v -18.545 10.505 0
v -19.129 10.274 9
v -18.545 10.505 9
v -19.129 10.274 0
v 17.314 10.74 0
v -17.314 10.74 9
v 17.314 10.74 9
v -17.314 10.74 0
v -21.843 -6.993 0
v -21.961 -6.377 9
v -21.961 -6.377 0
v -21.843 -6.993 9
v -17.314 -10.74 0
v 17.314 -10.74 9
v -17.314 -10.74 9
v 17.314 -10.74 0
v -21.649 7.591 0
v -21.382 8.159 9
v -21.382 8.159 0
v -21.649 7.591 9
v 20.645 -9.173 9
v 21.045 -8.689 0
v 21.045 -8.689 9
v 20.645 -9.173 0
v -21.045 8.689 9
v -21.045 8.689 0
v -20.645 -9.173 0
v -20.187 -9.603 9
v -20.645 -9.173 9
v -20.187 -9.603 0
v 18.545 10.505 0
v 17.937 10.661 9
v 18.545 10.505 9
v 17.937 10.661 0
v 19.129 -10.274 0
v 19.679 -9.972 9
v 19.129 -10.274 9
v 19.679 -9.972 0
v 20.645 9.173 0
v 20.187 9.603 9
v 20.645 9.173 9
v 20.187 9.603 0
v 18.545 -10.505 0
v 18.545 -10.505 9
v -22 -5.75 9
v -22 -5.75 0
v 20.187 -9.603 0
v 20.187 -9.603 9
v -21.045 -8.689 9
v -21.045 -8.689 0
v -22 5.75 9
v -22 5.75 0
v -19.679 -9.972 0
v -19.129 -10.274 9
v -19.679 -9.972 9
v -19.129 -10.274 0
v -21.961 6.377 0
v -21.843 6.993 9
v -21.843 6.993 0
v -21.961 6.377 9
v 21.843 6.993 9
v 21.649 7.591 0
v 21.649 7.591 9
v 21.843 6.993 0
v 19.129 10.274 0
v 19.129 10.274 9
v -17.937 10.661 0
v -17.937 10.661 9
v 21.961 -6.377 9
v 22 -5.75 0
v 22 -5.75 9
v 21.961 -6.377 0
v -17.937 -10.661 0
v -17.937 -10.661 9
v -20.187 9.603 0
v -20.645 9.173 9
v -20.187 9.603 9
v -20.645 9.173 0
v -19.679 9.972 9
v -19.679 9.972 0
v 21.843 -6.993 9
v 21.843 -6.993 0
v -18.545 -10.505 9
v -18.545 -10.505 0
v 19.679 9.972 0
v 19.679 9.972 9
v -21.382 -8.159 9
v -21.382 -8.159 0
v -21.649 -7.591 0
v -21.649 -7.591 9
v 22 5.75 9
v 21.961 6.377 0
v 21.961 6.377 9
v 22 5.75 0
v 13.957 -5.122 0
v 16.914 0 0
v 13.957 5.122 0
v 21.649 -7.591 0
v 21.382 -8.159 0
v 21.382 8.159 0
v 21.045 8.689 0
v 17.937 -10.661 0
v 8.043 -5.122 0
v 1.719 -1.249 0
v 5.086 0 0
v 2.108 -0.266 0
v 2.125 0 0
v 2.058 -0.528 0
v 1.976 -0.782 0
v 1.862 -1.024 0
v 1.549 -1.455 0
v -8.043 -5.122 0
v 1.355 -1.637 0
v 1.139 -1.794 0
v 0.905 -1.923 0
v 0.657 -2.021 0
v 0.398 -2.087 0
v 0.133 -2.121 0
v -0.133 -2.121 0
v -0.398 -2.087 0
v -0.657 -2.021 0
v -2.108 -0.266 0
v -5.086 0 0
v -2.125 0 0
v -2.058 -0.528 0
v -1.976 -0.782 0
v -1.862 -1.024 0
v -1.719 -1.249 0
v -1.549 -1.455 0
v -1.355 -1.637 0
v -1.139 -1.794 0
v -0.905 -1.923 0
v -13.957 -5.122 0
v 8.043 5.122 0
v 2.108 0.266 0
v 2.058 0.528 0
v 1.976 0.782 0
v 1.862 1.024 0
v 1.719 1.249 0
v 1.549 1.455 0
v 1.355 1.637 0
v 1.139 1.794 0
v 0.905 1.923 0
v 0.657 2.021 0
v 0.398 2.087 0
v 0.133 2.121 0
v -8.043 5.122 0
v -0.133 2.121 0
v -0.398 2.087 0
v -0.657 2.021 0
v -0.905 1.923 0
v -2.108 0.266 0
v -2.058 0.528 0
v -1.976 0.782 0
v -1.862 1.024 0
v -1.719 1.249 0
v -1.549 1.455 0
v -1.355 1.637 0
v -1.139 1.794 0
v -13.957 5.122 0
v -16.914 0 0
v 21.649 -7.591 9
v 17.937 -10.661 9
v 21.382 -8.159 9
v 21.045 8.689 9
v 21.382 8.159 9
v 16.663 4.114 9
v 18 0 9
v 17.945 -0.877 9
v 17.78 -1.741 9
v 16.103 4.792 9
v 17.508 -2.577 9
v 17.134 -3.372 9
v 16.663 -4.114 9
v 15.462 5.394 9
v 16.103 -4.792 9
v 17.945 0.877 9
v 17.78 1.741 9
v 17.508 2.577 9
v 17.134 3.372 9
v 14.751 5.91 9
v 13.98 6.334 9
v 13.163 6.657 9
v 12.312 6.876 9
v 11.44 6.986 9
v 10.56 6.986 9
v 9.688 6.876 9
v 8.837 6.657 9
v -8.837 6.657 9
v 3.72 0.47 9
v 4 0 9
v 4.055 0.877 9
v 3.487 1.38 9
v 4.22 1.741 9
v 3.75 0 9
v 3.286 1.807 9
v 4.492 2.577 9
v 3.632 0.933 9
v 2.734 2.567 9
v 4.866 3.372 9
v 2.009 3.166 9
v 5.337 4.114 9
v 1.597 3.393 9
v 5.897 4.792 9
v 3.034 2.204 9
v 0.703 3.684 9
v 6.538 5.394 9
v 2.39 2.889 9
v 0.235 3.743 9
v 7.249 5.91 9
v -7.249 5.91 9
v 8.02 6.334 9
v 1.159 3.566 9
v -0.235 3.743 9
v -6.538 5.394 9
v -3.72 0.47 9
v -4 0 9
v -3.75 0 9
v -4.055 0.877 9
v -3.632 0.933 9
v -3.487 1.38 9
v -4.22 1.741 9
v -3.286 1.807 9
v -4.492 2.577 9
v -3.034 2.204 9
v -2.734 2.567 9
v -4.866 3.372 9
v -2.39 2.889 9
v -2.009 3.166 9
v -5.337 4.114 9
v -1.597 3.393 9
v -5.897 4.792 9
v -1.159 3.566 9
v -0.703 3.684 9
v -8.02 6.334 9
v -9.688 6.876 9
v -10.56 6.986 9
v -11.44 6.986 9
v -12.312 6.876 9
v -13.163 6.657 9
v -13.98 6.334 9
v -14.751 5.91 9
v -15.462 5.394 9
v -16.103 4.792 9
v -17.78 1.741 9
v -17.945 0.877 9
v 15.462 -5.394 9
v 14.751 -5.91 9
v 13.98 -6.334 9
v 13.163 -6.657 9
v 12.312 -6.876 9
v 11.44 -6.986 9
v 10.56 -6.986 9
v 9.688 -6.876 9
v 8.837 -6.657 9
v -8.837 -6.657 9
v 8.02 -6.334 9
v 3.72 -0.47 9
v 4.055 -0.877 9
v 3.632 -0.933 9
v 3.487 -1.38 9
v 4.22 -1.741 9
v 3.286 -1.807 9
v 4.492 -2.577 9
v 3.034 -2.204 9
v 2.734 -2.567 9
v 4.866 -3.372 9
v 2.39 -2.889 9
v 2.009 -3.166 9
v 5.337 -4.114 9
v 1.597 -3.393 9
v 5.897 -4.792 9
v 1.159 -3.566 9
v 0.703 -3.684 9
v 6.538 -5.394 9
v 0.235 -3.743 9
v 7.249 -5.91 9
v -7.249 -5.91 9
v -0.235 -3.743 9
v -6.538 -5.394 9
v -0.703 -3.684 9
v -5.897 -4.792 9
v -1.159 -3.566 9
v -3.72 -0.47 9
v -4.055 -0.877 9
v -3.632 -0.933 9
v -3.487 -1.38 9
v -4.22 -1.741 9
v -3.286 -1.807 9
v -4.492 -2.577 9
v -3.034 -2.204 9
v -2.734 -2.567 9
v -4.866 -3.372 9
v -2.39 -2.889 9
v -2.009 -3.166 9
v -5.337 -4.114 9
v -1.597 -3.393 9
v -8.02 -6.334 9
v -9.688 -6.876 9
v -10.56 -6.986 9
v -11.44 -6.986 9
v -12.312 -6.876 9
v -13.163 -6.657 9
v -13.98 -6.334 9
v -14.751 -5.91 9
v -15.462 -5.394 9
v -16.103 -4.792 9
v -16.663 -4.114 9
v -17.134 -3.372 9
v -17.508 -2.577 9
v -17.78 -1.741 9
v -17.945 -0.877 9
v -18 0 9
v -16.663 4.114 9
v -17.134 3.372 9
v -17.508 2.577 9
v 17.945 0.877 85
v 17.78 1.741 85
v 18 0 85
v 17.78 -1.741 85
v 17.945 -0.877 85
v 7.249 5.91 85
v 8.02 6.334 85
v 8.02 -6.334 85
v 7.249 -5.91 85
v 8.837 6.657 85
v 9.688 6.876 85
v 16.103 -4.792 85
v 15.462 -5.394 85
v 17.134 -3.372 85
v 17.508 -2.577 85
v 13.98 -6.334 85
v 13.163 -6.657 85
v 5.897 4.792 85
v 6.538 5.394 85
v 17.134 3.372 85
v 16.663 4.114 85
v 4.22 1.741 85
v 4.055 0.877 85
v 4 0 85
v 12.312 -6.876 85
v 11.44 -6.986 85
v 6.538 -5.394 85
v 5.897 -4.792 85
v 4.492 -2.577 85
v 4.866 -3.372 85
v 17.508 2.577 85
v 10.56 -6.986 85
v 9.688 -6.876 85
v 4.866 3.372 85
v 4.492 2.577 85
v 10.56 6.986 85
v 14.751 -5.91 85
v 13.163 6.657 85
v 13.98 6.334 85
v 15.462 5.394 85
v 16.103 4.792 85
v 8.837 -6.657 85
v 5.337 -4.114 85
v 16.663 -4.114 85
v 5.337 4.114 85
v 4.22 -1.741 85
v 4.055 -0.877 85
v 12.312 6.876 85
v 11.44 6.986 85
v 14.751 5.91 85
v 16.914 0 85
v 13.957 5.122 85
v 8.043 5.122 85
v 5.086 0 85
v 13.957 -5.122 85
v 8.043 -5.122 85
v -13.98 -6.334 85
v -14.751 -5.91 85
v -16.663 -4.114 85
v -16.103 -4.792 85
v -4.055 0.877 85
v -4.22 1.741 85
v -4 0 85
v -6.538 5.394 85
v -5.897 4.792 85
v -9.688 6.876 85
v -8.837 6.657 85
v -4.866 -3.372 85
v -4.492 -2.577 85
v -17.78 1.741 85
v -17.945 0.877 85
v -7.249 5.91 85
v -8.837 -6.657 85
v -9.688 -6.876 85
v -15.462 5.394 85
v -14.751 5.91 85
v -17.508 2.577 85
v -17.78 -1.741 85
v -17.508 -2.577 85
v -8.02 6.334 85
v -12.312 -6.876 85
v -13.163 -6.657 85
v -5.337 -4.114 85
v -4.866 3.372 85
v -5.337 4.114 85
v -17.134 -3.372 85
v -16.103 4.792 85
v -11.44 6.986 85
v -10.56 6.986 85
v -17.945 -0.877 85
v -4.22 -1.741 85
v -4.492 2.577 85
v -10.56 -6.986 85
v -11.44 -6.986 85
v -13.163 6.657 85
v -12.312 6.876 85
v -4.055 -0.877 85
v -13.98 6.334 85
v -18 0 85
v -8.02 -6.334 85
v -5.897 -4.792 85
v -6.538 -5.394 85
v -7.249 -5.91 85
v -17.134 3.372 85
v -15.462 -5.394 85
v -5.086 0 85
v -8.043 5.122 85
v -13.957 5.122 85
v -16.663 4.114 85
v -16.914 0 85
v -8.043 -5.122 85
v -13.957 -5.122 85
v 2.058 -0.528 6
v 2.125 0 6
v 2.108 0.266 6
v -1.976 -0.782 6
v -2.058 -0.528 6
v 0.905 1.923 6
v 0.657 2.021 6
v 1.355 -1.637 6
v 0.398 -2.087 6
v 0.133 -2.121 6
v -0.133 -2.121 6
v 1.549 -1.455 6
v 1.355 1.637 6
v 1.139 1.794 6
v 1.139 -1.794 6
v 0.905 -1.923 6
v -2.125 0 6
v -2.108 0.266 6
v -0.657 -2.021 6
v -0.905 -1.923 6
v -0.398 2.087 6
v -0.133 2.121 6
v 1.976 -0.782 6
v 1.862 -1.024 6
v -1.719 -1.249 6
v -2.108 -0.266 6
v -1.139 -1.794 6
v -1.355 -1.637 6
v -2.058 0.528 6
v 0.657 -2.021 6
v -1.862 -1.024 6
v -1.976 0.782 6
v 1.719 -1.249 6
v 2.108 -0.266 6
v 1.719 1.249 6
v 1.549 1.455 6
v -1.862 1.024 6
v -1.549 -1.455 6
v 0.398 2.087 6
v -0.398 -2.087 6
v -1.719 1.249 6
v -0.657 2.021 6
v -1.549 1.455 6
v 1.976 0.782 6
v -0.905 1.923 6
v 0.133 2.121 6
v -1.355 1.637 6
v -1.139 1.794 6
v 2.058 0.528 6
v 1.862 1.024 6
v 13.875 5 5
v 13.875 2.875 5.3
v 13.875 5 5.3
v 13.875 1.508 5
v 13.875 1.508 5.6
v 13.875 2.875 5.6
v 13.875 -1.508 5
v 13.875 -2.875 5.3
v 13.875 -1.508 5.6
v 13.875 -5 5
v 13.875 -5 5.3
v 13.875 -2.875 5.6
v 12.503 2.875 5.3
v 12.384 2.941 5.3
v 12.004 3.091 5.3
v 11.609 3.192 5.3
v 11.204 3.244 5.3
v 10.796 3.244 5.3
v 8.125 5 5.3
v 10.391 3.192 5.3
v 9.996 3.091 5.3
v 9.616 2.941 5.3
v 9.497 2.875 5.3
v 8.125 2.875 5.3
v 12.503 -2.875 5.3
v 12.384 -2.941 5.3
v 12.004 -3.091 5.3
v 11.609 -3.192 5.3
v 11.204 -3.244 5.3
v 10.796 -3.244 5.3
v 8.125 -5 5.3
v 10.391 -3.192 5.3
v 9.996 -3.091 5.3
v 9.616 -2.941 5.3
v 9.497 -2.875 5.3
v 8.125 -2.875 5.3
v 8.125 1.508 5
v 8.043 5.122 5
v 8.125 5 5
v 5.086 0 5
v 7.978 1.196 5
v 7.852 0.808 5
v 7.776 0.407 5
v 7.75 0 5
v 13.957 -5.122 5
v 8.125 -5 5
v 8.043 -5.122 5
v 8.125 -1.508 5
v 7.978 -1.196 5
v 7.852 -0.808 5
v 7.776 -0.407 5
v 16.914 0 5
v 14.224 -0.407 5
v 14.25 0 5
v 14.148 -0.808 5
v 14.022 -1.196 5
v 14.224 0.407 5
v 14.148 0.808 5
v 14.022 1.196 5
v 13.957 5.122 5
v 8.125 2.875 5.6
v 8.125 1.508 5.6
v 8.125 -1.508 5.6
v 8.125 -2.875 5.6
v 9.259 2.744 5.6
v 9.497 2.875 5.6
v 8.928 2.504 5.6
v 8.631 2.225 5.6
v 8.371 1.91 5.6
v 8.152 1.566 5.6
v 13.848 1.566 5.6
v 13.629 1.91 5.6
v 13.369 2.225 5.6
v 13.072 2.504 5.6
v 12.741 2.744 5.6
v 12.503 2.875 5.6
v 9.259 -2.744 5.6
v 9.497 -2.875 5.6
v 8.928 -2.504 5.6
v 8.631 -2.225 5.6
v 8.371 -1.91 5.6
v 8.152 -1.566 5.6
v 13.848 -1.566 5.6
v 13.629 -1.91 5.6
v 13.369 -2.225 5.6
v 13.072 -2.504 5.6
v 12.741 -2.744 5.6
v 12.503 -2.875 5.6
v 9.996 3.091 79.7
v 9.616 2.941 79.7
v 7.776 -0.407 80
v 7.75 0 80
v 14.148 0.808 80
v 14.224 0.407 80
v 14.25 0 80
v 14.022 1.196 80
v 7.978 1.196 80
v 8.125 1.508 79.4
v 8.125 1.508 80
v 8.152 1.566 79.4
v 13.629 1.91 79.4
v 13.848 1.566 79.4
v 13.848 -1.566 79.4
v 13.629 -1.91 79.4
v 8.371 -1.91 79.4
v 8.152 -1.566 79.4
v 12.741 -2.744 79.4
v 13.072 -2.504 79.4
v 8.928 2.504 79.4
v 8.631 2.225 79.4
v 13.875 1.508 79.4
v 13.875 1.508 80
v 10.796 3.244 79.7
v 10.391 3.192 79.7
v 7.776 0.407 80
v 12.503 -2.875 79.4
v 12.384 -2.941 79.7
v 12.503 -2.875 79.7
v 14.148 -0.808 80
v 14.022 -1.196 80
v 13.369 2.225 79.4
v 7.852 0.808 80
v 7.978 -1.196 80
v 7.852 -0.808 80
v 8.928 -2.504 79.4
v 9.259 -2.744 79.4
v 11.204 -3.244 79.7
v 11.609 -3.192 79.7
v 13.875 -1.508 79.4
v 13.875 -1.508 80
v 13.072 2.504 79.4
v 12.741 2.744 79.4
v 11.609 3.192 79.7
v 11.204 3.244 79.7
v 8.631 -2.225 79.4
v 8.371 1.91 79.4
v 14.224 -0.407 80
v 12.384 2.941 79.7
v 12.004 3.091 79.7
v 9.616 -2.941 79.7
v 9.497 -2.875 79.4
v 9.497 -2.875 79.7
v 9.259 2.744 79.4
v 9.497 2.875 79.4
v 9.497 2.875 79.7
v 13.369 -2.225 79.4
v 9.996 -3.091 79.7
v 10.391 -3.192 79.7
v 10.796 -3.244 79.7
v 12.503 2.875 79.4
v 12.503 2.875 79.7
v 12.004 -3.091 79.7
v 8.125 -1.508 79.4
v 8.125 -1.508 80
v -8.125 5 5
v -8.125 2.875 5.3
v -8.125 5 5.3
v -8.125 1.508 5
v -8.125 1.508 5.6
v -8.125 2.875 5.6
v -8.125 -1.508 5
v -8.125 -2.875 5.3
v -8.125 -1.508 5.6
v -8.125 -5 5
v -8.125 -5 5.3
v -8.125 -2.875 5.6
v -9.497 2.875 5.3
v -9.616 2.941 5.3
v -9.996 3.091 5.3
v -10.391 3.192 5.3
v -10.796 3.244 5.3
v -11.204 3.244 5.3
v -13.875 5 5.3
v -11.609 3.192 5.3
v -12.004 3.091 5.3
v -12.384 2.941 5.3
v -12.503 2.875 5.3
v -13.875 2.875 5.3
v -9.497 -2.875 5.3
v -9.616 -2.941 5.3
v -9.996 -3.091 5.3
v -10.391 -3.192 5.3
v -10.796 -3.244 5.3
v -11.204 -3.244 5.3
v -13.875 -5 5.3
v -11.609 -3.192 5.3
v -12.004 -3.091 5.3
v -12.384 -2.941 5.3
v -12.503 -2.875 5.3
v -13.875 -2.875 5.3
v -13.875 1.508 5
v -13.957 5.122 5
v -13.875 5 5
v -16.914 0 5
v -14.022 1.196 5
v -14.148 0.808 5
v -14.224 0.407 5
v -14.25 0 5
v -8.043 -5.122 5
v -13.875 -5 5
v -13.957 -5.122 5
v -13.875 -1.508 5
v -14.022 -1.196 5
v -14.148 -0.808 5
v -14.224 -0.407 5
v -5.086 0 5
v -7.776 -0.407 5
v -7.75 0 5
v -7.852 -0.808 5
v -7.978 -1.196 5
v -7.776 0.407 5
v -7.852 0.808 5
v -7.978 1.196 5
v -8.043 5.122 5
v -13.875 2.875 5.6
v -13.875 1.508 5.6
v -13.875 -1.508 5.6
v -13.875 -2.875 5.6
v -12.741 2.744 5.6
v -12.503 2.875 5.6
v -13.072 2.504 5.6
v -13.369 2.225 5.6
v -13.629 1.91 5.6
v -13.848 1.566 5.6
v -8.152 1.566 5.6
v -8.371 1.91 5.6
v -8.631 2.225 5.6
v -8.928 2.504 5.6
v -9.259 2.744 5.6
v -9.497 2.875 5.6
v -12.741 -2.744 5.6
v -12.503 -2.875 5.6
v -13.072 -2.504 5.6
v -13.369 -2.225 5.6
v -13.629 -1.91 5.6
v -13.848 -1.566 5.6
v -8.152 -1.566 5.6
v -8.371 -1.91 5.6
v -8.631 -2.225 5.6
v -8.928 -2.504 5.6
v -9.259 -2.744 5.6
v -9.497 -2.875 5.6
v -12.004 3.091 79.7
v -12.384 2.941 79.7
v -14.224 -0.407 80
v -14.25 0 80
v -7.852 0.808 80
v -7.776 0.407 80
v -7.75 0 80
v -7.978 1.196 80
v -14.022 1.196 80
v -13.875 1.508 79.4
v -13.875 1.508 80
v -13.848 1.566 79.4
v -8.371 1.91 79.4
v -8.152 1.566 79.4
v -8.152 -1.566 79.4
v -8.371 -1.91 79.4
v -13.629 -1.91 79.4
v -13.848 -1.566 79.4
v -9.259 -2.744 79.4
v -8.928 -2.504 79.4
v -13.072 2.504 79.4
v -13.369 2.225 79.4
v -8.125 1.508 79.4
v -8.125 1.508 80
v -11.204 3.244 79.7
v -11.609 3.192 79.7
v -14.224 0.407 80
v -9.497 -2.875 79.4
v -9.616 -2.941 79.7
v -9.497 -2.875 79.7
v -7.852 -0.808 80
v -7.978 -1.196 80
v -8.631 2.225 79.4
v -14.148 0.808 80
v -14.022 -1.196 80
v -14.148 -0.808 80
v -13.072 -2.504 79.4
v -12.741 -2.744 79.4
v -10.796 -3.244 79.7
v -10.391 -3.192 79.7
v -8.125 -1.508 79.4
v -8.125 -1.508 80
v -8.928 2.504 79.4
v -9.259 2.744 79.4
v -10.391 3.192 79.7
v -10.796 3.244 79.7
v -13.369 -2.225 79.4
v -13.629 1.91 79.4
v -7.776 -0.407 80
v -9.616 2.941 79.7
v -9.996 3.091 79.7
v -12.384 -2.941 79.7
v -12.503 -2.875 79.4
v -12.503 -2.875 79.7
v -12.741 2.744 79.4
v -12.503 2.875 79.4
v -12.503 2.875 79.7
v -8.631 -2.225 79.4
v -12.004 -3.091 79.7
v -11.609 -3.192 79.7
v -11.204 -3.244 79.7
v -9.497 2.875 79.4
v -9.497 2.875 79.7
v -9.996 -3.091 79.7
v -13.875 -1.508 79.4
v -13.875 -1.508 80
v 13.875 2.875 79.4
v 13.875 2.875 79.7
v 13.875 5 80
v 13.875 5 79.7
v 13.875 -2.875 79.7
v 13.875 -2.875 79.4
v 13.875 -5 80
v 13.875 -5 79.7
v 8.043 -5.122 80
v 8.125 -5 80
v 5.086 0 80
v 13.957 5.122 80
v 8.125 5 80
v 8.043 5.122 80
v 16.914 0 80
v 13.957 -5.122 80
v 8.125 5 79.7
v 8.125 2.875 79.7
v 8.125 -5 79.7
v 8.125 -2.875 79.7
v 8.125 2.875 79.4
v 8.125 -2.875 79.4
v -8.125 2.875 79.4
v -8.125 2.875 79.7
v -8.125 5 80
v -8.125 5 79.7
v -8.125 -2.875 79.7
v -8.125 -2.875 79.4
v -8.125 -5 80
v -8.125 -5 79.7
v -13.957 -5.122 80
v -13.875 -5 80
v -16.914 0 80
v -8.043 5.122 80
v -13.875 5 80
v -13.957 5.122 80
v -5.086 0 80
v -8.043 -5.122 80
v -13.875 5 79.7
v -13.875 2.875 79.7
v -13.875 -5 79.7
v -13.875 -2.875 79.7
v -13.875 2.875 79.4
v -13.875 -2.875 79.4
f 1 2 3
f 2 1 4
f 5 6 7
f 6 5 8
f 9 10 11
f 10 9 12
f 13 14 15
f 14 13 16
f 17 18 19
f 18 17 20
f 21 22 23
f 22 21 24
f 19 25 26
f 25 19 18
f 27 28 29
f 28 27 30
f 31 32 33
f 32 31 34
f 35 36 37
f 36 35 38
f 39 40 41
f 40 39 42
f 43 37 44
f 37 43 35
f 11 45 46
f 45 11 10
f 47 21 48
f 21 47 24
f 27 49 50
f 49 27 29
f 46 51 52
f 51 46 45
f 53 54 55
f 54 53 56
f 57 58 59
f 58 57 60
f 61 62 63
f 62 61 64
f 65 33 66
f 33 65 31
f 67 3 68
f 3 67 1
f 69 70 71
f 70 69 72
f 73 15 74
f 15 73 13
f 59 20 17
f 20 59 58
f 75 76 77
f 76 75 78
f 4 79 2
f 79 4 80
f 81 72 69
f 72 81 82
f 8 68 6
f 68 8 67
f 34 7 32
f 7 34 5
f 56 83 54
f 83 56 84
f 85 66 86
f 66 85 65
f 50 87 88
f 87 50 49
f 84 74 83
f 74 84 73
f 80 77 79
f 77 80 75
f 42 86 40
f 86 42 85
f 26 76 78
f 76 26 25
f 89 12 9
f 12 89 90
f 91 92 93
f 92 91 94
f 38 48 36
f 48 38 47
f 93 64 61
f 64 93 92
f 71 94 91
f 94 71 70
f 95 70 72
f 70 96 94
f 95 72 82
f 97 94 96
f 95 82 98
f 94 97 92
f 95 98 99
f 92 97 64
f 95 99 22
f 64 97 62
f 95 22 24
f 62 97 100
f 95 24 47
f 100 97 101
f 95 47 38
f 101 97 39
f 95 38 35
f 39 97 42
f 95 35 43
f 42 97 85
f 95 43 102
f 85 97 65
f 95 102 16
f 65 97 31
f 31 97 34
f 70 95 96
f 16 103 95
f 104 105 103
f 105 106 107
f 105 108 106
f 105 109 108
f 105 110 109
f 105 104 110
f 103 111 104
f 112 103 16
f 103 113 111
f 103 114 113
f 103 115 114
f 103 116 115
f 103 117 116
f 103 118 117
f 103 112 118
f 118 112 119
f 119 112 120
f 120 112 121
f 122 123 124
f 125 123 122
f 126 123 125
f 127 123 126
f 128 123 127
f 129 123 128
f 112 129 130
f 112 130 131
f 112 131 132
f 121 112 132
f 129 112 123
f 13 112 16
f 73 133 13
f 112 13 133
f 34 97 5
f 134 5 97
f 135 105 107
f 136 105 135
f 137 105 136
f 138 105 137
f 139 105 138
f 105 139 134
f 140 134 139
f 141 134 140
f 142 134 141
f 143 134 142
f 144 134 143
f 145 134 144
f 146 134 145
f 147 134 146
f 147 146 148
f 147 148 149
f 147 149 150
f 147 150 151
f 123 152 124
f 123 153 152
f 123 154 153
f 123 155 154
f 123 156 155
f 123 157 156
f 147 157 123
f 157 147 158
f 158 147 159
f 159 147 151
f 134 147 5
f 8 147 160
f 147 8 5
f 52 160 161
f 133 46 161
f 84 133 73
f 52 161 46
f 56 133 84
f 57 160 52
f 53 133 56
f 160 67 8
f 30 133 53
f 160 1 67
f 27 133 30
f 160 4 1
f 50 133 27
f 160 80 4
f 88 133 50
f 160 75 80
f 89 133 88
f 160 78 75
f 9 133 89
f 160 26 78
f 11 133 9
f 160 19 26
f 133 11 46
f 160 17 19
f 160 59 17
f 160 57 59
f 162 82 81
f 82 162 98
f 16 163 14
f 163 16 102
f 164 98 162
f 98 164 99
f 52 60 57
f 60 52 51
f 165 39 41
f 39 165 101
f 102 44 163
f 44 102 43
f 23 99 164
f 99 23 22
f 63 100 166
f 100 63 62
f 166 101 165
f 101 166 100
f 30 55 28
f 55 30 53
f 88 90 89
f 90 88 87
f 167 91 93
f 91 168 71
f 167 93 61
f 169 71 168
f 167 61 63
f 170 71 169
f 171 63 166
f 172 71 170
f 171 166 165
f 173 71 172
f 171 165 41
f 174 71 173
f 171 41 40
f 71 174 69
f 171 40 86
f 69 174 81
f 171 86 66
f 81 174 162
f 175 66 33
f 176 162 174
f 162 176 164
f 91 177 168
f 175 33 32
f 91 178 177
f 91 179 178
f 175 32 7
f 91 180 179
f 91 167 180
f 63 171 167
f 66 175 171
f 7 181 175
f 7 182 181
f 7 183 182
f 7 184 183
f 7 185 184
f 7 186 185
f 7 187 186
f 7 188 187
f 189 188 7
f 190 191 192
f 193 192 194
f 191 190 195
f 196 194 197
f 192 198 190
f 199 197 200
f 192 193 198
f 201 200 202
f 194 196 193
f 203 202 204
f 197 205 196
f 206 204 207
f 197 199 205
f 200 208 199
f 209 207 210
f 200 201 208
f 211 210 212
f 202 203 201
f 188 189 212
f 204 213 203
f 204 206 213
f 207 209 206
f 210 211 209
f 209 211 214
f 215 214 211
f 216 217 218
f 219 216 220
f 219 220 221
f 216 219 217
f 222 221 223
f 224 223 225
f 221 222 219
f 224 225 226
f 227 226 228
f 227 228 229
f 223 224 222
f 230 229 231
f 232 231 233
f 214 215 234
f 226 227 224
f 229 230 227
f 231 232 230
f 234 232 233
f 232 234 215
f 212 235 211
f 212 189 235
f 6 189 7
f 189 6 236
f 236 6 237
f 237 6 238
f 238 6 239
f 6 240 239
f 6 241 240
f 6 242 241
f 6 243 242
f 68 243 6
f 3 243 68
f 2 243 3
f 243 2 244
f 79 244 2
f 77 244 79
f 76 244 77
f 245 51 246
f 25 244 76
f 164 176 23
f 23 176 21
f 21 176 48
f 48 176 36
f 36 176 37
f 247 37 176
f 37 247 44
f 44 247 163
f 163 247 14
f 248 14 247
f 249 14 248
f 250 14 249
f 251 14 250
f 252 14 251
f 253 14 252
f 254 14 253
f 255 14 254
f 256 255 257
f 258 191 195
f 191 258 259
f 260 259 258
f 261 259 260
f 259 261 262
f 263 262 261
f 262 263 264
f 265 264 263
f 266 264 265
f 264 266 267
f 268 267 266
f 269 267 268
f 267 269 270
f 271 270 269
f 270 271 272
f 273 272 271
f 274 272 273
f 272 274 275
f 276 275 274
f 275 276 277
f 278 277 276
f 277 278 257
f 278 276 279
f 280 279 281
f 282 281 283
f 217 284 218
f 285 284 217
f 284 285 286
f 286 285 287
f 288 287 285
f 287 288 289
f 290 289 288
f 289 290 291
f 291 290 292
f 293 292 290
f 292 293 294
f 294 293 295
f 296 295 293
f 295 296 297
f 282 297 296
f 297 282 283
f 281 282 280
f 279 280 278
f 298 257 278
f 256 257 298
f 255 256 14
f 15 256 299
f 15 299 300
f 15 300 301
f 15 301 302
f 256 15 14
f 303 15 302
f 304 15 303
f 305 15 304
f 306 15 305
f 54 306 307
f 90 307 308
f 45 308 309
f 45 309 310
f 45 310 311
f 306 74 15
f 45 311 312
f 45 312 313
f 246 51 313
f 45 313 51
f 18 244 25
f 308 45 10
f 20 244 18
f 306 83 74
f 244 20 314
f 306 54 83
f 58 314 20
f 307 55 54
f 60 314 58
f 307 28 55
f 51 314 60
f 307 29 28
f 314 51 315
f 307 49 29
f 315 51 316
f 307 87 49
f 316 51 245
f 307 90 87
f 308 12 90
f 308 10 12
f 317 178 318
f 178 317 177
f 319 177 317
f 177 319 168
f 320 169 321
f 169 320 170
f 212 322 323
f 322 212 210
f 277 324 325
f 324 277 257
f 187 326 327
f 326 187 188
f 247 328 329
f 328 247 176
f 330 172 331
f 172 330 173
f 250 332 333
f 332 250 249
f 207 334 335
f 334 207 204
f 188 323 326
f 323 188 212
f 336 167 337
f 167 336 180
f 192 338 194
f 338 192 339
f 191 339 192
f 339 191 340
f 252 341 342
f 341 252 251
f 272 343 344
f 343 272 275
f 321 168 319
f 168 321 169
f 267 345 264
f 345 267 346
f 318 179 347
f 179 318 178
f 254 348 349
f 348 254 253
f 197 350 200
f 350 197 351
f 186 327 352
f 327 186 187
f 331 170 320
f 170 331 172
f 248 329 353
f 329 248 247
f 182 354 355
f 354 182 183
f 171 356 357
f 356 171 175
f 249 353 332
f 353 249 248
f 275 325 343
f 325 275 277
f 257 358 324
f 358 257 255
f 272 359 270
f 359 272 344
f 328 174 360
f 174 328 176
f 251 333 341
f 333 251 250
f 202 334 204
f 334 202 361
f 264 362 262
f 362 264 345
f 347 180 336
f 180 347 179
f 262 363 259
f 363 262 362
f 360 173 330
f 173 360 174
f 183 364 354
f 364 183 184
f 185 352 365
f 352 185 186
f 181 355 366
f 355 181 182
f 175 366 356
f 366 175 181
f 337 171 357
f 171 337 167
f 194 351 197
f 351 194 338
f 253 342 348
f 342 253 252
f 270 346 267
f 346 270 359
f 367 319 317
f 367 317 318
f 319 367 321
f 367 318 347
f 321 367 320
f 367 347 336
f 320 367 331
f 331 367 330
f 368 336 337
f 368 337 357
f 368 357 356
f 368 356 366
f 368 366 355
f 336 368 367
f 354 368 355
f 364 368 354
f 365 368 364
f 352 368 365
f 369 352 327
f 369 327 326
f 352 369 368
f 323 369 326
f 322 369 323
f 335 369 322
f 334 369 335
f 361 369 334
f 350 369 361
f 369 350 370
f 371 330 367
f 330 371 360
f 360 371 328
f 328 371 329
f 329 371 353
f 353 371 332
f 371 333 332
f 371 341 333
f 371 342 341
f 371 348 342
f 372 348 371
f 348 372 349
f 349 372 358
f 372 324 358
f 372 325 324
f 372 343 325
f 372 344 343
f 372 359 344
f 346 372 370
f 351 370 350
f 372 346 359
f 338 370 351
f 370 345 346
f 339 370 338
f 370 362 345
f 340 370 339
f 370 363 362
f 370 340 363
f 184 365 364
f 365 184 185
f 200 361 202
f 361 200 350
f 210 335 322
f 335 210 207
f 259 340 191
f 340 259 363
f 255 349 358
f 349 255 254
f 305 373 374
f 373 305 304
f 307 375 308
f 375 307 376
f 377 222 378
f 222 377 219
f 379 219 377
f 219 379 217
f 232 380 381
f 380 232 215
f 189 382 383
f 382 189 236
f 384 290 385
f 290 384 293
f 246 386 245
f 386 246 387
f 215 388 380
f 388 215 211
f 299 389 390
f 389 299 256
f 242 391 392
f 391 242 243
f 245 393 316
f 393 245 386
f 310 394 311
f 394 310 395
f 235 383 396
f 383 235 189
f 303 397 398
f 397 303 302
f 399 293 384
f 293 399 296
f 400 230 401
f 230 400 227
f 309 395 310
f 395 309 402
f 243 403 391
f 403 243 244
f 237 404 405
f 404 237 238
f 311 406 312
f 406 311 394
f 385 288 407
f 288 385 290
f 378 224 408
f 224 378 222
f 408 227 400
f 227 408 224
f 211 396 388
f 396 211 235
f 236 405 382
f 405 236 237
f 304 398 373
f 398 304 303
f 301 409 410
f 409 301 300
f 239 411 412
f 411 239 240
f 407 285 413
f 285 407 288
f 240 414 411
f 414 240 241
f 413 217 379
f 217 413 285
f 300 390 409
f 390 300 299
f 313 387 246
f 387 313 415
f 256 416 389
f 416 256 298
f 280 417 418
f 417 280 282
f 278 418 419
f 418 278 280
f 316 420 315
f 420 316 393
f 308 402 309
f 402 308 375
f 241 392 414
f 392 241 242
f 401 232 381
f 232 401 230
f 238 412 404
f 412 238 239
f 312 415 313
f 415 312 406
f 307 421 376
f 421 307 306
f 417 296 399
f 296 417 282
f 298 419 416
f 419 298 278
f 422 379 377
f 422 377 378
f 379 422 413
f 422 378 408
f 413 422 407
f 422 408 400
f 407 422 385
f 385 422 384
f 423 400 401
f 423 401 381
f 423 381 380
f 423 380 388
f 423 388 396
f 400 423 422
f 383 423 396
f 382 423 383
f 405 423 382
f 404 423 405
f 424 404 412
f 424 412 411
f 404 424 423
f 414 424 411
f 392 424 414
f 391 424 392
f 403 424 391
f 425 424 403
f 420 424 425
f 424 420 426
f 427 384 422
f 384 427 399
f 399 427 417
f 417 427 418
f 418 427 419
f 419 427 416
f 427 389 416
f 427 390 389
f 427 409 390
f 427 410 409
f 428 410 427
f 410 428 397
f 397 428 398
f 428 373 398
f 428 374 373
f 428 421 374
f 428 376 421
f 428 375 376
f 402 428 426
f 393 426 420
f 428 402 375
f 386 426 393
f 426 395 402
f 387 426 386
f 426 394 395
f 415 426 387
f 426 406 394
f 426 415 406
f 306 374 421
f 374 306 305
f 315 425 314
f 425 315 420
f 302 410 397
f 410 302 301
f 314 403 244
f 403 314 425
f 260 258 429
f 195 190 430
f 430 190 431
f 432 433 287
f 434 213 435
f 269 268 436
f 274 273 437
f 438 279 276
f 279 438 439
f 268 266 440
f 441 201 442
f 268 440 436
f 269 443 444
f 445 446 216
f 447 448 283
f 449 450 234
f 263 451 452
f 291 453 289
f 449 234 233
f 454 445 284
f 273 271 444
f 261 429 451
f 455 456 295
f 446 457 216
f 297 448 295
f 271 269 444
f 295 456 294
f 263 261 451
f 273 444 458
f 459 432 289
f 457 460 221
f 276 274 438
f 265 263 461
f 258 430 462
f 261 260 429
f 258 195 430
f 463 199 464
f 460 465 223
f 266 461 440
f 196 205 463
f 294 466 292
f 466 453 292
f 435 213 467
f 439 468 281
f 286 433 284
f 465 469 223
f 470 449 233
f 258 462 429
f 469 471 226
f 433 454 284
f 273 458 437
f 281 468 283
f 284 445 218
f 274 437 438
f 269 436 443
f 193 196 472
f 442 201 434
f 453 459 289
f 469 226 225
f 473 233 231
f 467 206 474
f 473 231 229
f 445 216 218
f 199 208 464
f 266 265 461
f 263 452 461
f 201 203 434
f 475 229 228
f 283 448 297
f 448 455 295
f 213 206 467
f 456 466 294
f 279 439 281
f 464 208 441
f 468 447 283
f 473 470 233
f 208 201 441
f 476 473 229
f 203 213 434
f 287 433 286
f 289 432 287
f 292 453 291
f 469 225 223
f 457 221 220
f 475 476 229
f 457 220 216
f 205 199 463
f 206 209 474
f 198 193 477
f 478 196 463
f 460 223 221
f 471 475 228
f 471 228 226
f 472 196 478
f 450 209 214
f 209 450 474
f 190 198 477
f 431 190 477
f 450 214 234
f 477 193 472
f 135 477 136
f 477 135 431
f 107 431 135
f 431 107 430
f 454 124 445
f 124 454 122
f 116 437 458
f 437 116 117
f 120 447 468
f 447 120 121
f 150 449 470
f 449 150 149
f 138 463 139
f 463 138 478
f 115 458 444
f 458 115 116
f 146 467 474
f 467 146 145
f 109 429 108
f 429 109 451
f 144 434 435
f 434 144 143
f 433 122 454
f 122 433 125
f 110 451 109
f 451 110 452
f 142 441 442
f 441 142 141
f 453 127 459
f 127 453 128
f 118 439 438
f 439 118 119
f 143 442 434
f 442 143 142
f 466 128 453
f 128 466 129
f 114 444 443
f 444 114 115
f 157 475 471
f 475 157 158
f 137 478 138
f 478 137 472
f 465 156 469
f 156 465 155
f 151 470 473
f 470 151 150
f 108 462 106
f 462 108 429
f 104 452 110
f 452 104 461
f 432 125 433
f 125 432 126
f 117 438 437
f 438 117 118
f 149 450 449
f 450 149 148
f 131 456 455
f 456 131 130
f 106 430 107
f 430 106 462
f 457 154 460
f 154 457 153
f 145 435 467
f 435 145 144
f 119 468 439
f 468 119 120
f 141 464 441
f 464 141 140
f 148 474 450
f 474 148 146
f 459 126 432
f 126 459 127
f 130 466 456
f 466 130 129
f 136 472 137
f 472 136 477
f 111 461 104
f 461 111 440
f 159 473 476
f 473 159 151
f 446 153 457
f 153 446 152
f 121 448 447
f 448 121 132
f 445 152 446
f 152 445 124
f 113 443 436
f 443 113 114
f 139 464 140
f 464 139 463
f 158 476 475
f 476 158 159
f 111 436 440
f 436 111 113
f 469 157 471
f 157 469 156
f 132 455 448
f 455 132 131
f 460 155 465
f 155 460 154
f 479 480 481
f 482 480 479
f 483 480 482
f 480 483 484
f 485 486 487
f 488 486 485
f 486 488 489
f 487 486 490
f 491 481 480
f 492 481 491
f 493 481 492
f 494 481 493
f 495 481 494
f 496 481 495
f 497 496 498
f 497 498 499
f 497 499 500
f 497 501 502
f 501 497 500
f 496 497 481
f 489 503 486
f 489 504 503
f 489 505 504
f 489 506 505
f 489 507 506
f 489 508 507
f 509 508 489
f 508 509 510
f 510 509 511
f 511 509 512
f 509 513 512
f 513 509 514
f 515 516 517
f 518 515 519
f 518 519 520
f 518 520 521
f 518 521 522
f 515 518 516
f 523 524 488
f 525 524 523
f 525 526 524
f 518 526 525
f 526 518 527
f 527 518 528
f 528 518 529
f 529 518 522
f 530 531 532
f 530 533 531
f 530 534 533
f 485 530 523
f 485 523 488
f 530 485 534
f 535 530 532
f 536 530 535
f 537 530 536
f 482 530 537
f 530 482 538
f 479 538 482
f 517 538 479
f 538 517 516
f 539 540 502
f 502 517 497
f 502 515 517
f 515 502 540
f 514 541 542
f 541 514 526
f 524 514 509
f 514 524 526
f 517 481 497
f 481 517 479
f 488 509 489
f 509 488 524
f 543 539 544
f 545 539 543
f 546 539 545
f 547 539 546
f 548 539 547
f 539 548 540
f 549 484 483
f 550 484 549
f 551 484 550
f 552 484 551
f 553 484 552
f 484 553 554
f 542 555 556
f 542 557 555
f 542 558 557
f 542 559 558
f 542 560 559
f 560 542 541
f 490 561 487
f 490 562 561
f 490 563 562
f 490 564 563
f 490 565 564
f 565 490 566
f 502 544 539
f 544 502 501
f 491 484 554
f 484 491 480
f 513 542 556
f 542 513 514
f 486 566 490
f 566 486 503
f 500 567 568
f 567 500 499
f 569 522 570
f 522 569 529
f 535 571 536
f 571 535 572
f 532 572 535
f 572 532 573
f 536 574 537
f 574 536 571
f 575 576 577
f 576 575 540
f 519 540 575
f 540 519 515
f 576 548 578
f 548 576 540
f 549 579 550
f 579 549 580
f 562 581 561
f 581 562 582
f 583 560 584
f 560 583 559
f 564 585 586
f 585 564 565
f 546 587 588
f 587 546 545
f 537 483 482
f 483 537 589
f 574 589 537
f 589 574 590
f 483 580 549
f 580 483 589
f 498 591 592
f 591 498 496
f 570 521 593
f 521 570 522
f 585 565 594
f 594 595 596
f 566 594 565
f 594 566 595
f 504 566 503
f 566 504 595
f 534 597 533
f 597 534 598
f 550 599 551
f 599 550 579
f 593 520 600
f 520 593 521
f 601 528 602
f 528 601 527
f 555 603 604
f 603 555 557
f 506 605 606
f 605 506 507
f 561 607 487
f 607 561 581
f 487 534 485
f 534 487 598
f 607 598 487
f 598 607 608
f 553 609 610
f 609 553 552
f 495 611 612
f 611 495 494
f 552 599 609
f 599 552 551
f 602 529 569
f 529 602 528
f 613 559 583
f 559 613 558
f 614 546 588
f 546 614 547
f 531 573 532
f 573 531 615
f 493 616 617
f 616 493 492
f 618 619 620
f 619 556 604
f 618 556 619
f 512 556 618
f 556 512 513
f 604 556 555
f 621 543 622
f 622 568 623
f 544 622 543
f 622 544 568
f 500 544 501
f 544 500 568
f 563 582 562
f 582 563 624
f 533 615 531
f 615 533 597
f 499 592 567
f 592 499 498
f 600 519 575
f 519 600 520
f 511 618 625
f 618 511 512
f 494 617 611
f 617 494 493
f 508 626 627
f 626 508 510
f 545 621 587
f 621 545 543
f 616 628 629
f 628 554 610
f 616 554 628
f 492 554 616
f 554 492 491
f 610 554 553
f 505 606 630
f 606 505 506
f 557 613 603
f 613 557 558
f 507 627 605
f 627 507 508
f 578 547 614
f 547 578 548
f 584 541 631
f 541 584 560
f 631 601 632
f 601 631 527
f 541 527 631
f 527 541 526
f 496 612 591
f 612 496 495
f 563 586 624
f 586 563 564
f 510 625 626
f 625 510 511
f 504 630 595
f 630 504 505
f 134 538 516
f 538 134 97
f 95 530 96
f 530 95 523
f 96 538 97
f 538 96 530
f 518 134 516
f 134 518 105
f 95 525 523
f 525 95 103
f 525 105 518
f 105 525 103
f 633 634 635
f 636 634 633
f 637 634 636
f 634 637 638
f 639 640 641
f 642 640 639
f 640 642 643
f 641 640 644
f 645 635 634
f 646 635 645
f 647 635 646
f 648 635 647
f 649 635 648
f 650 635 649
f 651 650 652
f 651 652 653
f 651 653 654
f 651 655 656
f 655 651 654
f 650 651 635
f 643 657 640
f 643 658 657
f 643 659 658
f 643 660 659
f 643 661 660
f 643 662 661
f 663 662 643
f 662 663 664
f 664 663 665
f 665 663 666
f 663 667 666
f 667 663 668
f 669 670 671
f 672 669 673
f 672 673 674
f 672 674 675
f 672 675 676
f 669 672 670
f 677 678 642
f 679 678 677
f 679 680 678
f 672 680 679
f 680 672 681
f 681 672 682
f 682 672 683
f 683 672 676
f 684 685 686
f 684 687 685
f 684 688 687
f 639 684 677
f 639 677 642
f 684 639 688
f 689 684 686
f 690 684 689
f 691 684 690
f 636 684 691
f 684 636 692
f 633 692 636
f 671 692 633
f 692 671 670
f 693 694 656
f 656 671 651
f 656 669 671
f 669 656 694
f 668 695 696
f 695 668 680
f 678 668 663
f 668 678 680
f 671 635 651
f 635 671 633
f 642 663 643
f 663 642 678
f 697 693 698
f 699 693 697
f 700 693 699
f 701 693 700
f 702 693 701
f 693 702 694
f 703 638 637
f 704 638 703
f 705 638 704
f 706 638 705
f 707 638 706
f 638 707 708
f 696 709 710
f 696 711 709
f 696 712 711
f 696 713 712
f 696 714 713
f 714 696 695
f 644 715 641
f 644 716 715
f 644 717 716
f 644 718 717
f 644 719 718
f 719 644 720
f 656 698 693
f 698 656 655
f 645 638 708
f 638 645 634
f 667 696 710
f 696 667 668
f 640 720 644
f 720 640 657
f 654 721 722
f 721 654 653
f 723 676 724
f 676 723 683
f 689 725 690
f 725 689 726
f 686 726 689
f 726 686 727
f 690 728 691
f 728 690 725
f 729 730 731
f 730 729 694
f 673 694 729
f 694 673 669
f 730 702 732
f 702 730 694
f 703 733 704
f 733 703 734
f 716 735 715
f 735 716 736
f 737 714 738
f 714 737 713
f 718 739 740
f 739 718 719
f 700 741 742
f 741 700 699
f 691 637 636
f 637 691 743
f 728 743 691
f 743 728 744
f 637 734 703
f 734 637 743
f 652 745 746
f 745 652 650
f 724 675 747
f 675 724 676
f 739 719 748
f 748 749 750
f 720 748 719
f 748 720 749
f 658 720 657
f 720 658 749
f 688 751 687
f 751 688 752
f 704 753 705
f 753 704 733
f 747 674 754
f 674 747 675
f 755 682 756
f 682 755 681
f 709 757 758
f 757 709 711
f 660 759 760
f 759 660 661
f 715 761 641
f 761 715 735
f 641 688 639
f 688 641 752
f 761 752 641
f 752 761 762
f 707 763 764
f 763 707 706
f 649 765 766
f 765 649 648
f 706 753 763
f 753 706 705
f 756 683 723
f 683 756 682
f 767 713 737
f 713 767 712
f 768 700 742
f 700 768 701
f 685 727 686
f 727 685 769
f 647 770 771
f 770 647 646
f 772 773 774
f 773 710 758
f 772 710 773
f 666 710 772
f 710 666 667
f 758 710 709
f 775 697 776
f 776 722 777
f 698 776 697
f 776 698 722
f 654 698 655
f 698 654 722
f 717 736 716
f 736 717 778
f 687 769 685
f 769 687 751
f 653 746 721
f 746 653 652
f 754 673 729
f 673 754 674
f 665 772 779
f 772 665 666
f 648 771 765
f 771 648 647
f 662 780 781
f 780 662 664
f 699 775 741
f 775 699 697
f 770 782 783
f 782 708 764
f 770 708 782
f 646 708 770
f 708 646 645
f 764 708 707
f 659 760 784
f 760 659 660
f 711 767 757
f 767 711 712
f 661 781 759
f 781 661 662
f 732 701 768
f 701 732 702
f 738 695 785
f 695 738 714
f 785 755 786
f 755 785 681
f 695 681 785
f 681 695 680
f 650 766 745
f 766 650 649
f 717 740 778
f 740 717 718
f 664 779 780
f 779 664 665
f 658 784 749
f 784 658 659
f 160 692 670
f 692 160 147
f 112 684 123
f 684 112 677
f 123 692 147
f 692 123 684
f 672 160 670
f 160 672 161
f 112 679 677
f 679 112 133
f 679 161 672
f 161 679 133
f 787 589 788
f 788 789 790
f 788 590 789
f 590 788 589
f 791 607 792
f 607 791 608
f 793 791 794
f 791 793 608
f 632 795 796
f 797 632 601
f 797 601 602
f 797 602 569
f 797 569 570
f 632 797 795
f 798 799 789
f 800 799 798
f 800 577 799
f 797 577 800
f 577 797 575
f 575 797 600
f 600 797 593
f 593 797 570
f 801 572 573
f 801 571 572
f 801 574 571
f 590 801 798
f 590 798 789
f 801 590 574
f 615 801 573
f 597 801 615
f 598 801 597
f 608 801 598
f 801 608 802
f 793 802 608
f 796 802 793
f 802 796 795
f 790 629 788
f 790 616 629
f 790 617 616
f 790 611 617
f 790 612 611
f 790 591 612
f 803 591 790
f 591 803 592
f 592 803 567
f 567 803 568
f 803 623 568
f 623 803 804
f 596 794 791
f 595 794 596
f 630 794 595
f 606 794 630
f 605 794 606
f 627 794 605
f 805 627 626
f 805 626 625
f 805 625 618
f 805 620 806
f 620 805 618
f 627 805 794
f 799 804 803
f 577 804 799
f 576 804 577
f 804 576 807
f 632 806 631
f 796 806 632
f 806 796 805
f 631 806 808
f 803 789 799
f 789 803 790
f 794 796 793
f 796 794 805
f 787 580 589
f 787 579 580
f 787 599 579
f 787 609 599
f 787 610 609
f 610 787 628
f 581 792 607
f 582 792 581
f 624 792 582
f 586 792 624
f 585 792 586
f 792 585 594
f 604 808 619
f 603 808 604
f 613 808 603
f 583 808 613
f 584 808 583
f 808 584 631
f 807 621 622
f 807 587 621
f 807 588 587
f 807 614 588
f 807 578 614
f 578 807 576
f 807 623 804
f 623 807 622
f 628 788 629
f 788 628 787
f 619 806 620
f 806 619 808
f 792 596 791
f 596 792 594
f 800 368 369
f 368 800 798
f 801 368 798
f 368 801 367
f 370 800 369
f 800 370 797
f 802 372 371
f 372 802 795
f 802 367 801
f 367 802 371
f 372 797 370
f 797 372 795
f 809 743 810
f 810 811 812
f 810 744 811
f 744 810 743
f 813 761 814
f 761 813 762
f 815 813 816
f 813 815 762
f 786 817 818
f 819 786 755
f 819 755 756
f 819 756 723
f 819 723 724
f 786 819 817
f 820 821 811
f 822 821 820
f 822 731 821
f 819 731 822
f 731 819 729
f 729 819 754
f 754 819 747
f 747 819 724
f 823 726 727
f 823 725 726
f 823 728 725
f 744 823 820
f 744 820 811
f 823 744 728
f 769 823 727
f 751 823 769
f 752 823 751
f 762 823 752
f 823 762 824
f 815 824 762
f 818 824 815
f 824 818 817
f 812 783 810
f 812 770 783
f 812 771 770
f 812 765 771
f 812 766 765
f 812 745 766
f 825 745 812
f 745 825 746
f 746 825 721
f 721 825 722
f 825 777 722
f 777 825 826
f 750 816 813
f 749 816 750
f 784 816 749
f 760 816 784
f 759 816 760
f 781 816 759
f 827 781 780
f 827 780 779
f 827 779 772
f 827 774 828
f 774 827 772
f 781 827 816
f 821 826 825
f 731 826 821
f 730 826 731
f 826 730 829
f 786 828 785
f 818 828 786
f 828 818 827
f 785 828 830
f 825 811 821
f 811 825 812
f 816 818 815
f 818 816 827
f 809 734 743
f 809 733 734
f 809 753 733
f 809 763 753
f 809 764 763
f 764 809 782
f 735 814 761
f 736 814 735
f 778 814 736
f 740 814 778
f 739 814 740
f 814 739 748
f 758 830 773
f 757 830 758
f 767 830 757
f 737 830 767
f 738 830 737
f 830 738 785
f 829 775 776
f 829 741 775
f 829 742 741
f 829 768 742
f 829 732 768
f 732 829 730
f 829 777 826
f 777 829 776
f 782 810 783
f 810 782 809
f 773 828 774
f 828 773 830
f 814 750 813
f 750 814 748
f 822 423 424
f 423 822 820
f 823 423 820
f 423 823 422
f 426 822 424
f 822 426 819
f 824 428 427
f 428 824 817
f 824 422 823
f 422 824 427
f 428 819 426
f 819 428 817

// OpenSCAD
$fn = 50;


difference() {
	union() {
		hull() {
			translate(v = [-17.0000000000, 5.7500000000, 0]) {
				cylinder(h = 9, r = 5);
			}
			translate(v = [17.0000000000, 5.7500000000, 0]) {
				cylinder(h = 9, r = 5);
			}
			translate(v = [-17.0000000000, -5.7500000000, 0]) {
				cylinder(h = 9, r = 5);
			}
			translate(v = [17.0000000000, -5.7500000000, 0]) {
				cylinder(h = 9, r = 5);
			}
		}
		translate(v = [11.0000000000, 0, 0.0000000000]) {
			cylinder(h = 85, r = 7.0000000000);
		}
		translate(v = [-11.0000000000, 0, 0.0000000000]) {
			cylinder(h = 85, r = 7.0000000000);
		}
	}
	union() {
		translate(v = [0, 0, 9]) {
			rotate(a = [0, 0, 0]) {
				difference() {
					union() {
						#translate(v = [0, 0, -80.0000000000]) {
							cylinder(h = 80, r = 2.0000000000);
						}
						#translate(v = [0, 0, -3]) {
							cylinder(h = 3, r1 = 2.1250000000, r2 = 3.7500000000);
						}
						#translate(v = [0, 0, -80.0000000000]) {
							cylinder(h = 80, r = 2.1250000000);
						}
						#translate(v = [0, 0, -80.0000000000]) {
							cylinder(h = 80, r = 2.0000000000);
						}
					}
					union();
				}
			}
		}
		translate(v = [11.0000000000, 0, 0]) {
			rotate(a = [0, 0, 0]) {
				difference() {
					union() {
						#translate(v = [-2.8750000000, -5.0000000000, -0.3000000000]) {
							cube(size = [5.7500000000, 10, 0.3000000000]);
						}
						#translate(v = [-2.8750000000, -2.8750000000, -0.6000000000]) {
							cube(size = [5.7500000000, 5.7500000000, 0.3000000000]);
						}
						#translate(v = [-2.8750000000, -5.0000000000, 5]) {
							cube(size = [5.7500000000, 10, 0.3000000000]);
						}
						#translate(v = [-2.8750000000, -2.8750000000, 5.3000000000]) {
							cube(size = [5.7500000000, 5.7500000000, 0.3000000000]);
						}
						#translate(v = [0, 0, -100.0000000000]) {
							cylinder(h = 200, r = 3.2500000000);
						}
						#linear_extrude(height = 5) {
							polygon(points = [[5.9142500000, 0.0000000000], [2.9571250000, 5.1218907443], [-2.9571250000, 5.1218907443], [-5.9142500000, 0.0000000000], [-2.9571250000, -5.1218907443], [2.9571250000, -5.1218907443]]);
						}
						#translate(v = [-2.8750000000, -5.0000000000, -0.3000000000]) {
							cube(size = [5.7500000000, 10, 0.3000000000]);
						}
						#translate(v = [-2.8750000000, -2.8750000000, -0.6000000000]) {
							cube(size = [5.7500000000, 5.7500000000, 0.3000000000]);
						}
						#translate(v = [-2.8750000000, -5.0000000000, 5]) {
							cube(size = [5.7500000000, 10, 0.3000000000]);
						}
						#translate(v = [-2.8750000000, -2.8750000000, 5.3000000000]) {
							cube(size = [5.7500000000, 5.7500000000, 0.3000000000]);
						}
						#translate(v = [0, 0, -100.0000000000]) {
							cylinder(h = 200, r = 3.2500000000);
						}
						#translate(v = [-2.8750000000, -5.0000000000, -0.3000000000]) {
							cube(size = [5.7500000000, 10, 0.3000000000]);
						}
						#translate(v = [-2.8750000000, -2.8750000000, -0.6000000000]) {
							cube(size = [5.7500000000, 5.7500000000, 0.3000000000]);
						}
						#translate(v = [-2.8750000000, -5.0000000000, 5]) {
							cube(size = [5.7500000000, 10, 0.3000000000]);
						}
						#translate(v = [-2.8750000000, -2.8750000000, 5.3000000000]) {
							cube(size = [5.7500000000, 5.7500000000, 0.3000000000]);
						}
						#translate(v = [0, 0, -100.0000000000]) {
							cylinder(h = 200, r = 3.2500000000);
						}
					}
					union();
				}
			}
		}
		translate(v = [-11.0000000000, 0, 0]) {
			rotate(a = [0, 0, 0]) {
				difference() {
					union() {
						#translate(v = [-2.8750000000, -5.0000000000, -0.3000000000]) {
							cube(size = [5.7500000000, 10, 0.3000000000]);
						}
						#translate(v = [-2.8750000000, -2.8750000000, -0.6000000000]) {
							cube(size = [5.7500000000, 5.7500000000, 0.3000000000]);
						}
						#translate(v = [-2.8750000000, -5.0000000000, 5]) {
							cube(size = [5.7500000000, 10, 0.3000000000]);
						}
						#translate(v = [-2.8750000000, -2.8750000000, 5.3000000000]) {
							cube(size = [5.7500000000, 5.7500000000, 0.3000000000]);
						}
						#translate(v = [0, 0, -100.0000000000]) {
							cylinder(h = 200, r = 3.2500000000);
						}
						#linear_extrude(height = 5) {
							polygon(points = [[5.9142500000, 0.0000000000], [2.9571250000, 5.1218907443], [-2.9571250000, 5.1218907443], [-5.9142500000, 0.0000000000], [-2.9571250000, -5.1218907443], [2.9571250000, -5.1218907443]]);
						}
						#translate(v = [-2.8750000000, -5.0000000000, -0.3000000000]) {
							cube(size = [5.7500000000, 10, 0.3000000000]);
						}
						#translate(v = [-2.8750000000, -2.8750000000, -0.6000000000]) {
							cube(size = [5.7500000000, 5.7500000000, 0.3000000000]);
						}
						#translate(v = [-2.8750000000, -5.0000000000, 5]) {
							cube(size = [5.7500000000, 10, 0.3000000000]);
						}
						#translate(v = [-2.8750000000, -2.8750000000, 5.3000000000]) {
							cube(size = [5.7500000000, 5.7500000000, 0.3000000000]);
						}
						#translate(v = [0, 0, -100.0000000000]) {
							cylinder(h = 200, r = 3.2500000000);
						}
						#translate(v = [-2.8750000000, -5.0000000000, -0.3000000000]) {
							cube(size = [5.7500000000, 10, 0.3000000000]);
						}
						#translate(v = [-2.8750000000, -2.8750000000, -0.6000000000]) {
							cube(size = [5.7500000000, 5.7500000000, 0.3000000000]);
						}
						#translate(v = [-2.8750000000, -5.0000000000, 5]) {
							cube(size = [5.7500000000, 10, 0.3000000000]);
						}
						#translate(v = [-2.8750000000, -2.8750000000, 5.3000000000]) {
							cube(size = [5.7500000000, 5.7500000000, 0.3000000000]);
						}
						#translate(v = [0, 0, -100.0000000000]) {
							cylinder(h = 200, r = 3.2500000000);
						}
					}
					union();
				}
			}
		}
		translate(v = [11.0000000000, 0, 85]) {
			rotate(a = [0, 0, 0]) {
				difference() {
					union() {
						#translate(v = [-2.8750000000, -5.0000000000, -5.3000000000]) {
							cube(size = [5.7500000000, 10, 0.3000000000]);
						}
						#translate(v = [-2.8750000000, -2.8750000000, -5.6000000000]) {
							cube(size = [5.7500000000, 5.7500000000, 0.3000000000]);
						}
						#translate(v = [-2.8750000000, -5.0000000000, 0]) {
							cube(size = [5.7500000000, 10, 0.3000000000]);
						}
						#translate(v = [-2.8750000000, -2.8750000000, 0.3000000000]) {
							cube(size = [5.7500000000, 5.7500000000, 0.3000000000]);
						}
						#translate(v = [0, 0, -100.0000000000]) {
							cylinder(h = 200, r = 3.2500000000);
						}
						translate(v = [0, 0, -5]) {
							#linear_extrude(height = 5) {
								polygon(points = [[5.9142500000, 0.0000000000], [2.9571250000, 5.1218907443], [-2.9571250000, 5.1218907443], [-5.9142500000, 0.0000000000], [-2.9571250000, -5.1218907443], [2.9571250000, -5.1218907443]]);
							}
						}
						#translate(v = [-2.8750000000, -5.0000000000, -5.3000000000]) {
							cube(size = [5.7500000000, 10, 0.3000000000]);
						}
						#translate(v = [-2.8750000000, -2.8750000000, -5.6000000000]) {
							cube(size = [5.7500000000, 5.7500000000, 0.3000000000]);
						}
						#translate(v = [-2.8750000000, -5.0000000000, 0]) {
							cube(size = [5.7500000000, 10, 0.3000000000]);
						}
						#translate(v = [-2.8750000000, -2.8750000000, 0.3000000000]) {
							cube(size = [5.7500000000, 5.7500000000, 0.3000000000]);
						}
						#translate(v = [0, 0, -100.0000000000]) {
							cylinder(h = 200, r = 3.2500000000);
						}
						#translate(v = [-2.8750000000, -5.0000000000, -5.3000000000]) {
							cube(size = [5.7500000000, 10, 0.3000000000]);
						}
						#translate(v = [-2.8750000000, -2.8750000000, -5.6000000000]) {
							cube(size = [5.7500000000, 5.7500000000, 0.3000000000]);
						}
						#translate(v = [-2.8750000000, -5.0000000000, 0]) {
							cube(size = [5.7500000000, 10, 0.3000000000]);
						}
						#translate(v = [-2.8750000000, -2.8750000000, 0.3000000000]) {
							cube(size = [5.7500000000, 5.7500000000, 0.3000000000]);
						}
						#translate(v = [0, 0, -100.0000000000]) {
							cylinder(h = 200, r = 3.2500000000);
						}
					}
					union();
				}
			}
		}
		translate(v = [-11.0000000000, 0, 85]) {
			rotate(a = [0, 0, 0]) {
				difference() {
					union() {
						#translate(v = [-2.8750000000, -5.0000000000, -5.3000000000]) {
							cube(size = [5.7500000000, 10, 0.3000000000]);
						}
						#translate(v = [-2.8750000000, -2.8750000000, -5.6000000000]) {
							cube(size = [5.7500000000, 5.7500000000, 0.3000000000]);
						}
						#translate(v = [-2.8750000000, -5.0000000000, 0]) {
							cube(size = [5.7500000000, 10, 0.3000000000]);
						}
						#translate(v = [-2.8750000000, -2.8750000000, 0.3000000000]) {
							cube(size = [5.7500000000, 5.7500000000, 0.3000000000]);
						}
						#translate(v = [0, 0, -100.0000000000]) {
							cylinder(h = 200, r = 3.2500000000);
						}
						translate(v = [0, 0, -5]) {
							#linear_extrude(height = 5) {
								polygon(points = [[5.9142500000, 0.0000000000], [2.9571250000, 5.1218907443], [-2.9571250000, 5.1218907443], [-5.9142500000, 0.0000000000], [-2.9571250000, -5.1218907443], [2.9571250000, -5.1218907443]]);
							}
						}
						#translate(v = [-2.8750000000, -5.0000000000, -5.3000000000]) {
							cube(size = [5.7500000000, 10, 0.3000000000]);
						}
						#translate(v = [-2.8750000000, -2.8750000000, -5.6000000000]) {
							cube(size = [5.7500000000, 5.7500000000, 0.3000000000]);
						}
						#translate(v = [-2.8750000000, -5.0000000000, 0]) {
							cube(size = [5.7500000000, 10, 0.3000000000]);
						}
						#translate(v = [-2.8750000000, -2.8750000000, 0.3000000000]) {
							cube(size = [5.7500000000, 5.7500000000, 0.3000000000]);
						}
						#translate(v = [0, 0, -100.0000000000]) {
							cylinder(h = 200, r = 3.2500000000);
						}
						#translate(v = [-2.8750000000, -5.0000000000, -5.3000000000]) {
							cube(size = [5.7500000000, 10, 0.3000000000]);
						}
						#translate(v = [-2.8750000000, -2.8750000000, -5.6000000000]) {
							cube(size = [5.7500000000, 5.7500000000, 0.3000000000]);
						}
						#translate(v = [-2.8750000000, -5.0000000000, 0]) {
							cube(size = [5.7500000000, 10, 0.3000000000]);
						}
						#translate(v = [-2.8750000000, -2.8750000000, 0.3000000000]) {
							cube(size = [5.7500000000, 5.7500000000, 0.3000000000]);
						}
						#translate(v = [0, 0, -100.0000000000]) {
							cylinder(h = 200, r = 3.2500000000);
						}
					}
					union();
				}
			}
		}
	}
}
